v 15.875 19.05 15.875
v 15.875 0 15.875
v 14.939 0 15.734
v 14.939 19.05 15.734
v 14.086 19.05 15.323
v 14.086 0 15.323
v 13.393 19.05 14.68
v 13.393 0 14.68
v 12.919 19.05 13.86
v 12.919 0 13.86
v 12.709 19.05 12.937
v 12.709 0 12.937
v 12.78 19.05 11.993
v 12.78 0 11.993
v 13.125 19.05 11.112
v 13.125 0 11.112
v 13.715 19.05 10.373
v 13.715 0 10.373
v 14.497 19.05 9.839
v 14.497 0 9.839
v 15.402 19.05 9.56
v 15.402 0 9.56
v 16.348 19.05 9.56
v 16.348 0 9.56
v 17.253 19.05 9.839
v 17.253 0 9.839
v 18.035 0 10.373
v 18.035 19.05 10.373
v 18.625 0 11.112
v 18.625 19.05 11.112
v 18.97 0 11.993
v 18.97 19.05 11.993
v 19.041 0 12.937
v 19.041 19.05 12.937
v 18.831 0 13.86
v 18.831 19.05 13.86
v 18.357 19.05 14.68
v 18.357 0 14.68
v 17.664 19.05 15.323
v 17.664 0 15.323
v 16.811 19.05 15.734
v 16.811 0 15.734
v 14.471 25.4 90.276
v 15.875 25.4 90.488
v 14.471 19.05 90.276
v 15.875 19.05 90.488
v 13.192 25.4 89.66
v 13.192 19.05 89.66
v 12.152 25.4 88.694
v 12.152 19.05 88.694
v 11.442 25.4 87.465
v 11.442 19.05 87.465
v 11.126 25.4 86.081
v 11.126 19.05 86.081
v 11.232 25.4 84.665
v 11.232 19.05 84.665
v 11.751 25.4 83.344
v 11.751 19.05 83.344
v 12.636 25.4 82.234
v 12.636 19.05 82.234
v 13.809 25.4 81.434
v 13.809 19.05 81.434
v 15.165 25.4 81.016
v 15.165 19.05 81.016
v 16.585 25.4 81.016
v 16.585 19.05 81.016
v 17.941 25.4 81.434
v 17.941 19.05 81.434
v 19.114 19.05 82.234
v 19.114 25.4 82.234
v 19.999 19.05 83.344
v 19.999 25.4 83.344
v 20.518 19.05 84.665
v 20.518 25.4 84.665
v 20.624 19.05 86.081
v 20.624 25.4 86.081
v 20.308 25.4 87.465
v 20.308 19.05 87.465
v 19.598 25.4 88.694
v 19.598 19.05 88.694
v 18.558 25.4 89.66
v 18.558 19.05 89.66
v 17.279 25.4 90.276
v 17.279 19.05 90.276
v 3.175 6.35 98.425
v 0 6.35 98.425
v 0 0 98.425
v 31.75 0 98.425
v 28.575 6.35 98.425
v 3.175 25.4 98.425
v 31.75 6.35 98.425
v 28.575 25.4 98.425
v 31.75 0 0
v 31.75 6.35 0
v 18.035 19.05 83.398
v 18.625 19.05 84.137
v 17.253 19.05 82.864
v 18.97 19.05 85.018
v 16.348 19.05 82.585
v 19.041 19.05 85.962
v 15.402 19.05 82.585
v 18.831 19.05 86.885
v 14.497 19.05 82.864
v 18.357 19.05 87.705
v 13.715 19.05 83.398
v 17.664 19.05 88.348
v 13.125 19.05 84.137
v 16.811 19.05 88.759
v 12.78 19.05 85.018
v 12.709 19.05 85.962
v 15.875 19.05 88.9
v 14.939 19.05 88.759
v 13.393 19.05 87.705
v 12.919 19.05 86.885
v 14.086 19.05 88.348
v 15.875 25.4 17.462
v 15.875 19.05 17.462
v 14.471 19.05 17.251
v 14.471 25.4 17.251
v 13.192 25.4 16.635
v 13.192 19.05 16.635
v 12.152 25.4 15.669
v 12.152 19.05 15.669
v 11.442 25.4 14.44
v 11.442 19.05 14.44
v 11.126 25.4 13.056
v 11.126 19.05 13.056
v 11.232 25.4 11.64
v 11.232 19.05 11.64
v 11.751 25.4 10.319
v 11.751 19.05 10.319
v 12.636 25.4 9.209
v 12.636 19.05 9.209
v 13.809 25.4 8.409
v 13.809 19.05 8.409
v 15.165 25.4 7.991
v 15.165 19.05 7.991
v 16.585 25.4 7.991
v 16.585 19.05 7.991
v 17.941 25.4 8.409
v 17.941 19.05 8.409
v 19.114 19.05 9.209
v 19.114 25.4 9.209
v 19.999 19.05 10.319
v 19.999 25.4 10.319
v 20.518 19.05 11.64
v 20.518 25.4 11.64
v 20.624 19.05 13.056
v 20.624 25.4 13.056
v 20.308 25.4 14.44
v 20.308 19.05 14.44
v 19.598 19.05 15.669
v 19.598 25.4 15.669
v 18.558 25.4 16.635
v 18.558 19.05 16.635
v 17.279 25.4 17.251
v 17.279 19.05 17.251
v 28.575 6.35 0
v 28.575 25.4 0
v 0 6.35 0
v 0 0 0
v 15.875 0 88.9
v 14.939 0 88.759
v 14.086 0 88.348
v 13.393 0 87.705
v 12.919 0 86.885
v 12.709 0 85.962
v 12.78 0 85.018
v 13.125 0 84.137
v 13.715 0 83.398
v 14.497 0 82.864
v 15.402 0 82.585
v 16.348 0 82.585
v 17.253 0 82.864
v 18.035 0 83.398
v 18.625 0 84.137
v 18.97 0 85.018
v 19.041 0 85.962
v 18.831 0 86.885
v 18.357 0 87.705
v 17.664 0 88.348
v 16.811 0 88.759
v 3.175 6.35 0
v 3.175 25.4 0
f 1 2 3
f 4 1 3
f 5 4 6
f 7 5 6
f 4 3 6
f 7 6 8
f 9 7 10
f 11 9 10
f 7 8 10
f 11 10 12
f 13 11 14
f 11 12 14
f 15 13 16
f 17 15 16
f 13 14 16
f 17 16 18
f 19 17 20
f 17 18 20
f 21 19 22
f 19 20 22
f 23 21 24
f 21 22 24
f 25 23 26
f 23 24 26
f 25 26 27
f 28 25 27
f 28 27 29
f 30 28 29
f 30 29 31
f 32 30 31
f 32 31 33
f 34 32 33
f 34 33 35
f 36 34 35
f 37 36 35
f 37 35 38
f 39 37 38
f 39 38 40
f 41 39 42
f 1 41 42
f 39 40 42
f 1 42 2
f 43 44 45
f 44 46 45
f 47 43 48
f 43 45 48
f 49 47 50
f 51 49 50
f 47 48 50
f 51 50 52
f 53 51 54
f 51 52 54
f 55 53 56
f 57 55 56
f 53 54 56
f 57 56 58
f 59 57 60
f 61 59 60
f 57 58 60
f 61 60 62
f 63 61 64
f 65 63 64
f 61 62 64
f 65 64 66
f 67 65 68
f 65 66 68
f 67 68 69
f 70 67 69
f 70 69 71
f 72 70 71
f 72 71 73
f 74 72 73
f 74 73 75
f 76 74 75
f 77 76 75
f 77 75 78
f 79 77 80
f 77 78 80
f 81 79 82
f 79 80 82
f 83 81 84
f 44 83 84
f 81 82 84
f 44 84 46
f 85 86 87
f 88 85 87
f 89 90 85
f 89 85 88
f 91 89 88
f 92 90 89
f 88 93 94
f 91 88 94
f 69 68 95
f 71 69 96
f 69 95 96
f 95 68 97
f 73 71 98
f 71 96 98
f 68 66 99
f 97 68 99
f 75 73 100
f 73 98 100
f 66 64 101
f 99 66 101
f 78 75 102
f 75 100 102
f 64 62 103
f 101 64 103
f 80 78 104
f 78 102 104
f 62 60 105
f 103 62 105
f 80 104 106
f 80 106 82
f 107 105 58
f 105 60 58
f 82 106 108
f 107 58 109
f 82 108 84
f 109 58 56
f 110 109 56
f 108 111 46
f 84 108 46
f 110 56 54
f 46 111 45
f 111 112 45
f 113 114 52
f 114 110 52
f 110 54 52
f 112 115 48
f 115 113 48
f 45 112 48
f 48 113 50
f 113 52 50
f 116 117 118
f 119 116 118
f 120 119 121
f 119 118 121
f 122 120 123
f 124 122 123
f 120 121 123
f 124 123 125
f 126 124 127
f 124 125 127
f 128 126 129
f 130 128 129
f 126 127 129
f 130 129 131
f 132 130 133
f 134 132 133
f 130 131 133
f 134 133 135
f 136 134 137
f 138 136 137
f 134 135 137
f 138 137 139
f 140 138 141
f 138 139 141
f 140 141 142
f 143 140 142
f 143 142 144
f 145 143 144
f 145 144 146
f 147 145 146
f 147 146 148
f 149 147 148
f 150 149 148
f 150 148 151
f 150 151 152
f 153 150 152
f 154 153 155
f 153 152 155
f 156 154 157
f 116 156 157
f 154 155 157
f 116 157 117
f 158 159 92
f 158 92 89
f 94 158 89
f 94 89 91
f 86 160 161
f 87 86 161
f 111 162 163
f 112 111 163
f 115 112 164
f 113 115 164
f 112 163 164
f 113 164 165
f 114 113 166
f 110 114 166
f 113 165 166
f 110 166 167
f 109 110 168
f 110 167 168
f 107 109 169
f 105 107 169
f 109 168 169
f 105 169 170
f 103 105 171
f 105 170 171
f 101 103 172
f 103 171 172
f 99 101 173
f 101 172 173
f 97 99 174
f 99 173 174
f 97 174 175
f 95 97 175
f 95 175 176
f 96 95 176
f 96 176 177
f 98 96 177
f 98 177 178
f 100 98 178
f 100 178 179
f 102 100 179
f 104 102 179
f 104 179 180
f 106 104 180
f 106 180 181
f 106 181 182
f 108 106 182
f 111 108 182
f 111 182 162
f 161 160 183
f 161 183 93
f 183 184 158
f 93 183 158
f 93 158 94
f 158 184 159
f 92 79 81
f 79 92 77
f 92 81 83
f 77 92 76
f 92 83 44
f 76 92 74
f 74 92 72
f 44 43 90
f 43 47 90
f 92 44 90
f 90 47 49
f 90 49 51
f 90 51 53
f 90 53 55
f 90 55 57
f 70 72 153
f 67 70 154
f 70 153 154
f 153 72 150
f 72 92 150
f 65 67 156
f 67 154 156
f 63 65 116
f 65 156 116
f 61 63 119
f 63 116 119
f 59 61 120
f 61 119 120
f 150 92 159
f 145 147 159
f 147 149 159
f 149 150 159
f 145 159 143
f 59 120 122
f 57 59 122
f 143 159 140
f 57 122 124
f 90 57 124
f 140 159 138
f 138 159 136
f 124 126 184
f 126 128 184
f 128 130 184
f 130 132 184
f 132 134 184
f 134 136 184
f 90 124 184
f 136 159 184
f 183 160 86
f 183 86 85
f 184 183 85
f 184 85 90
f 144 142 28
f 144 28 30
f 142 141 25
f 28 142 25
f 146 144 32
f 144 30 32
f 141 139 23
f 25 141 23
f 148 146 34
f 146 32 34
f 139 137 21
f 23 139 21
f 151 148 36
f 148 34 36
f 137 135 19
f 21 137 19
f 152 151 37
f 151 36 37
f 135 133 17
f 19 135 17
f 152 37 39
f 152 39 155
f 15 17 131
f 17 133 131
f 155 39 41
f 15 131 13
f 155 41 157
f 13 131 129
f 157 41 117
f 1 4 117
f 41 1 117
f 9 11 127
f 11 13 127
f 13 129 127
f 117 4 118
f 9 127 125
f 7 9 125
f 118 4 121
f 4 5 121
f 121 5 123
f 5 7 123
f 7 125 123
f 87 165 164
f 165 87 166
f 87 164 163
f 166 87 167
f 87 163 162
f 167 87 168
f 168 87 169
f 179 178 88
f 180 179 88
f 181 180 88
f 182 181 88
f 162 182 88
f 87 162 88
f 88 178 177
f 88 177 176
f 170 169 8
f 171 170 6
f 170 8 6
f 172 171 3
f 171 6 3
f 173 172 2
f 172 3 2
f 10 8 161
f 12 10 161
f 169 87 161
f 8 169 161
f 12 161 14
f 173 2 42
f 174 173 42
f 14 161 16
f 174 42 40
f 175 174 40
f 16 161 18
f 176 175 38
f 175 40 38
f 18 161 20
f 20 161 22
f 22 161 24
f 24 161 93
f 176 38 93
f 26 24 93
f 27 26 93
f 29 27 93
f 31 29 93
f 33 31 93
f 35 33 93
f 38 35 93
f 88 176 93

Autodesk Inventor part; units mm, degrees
ref_plane "YZ Plane" through (0, 0, 0) normal (1, 0, 0) x (0, 1, 0)
ref_plane "XZ Plane" through (0, 0, 0) normal (0, 1, 0) x (-1, 0, 0)
ref_plane "XY Plane" through (0, 0, 0) normal (0, 0, 1) x (1, 0, 0)
sketch "Sketch1" plane through (0, 0, 0) normal (0, 0, 1) x (1, 0, 0)
  line L0 (0, 0) -> (31.75, 0)
  line L1 (31.75, 0) -> (31.75, 6.35)
  line L2 (31.75, 25.4) -> (28.575, 25.4) construction
  line L3 (0, 25.4) -> (0, 6.35) construction
  line L4 (0, 6.35) -> (3.175, 6.35)
  line L5 (3.175, 6.35) -> (3.175, 25.4)
  line L6 (28.575, 25.4) -> (28.575, 6.35)
  line L7 (28.575, 6.35) -> (31.75, 6.35)
  line L8 (0, 6.35) -> (0, 0)
  line L9 (3.175, 25.4) -> (0, 25.4) construction
  line L10 (28.575, 25.4) -> (3.175, 25.4)
  line L11 (31.75, 6.35) -> (31.75, 25.4) construction
  dimension "d0" = 31.75
  dimension "d1" = 25.4
  dimension "d2" = 6.35
  dimension "d3" = 3.175
extrude "Extrusion1" add sketch "Sketch1" along normal blind 98.425
sketch "Sketch2" plane through (3.175, 25.4, 0) normal (0, 1, 0) x (1, 0, 0)
  line L0 (0, -98.425) -> (25.4, -98.425) projected
  line L1 (25.4, 0) -> (25.4, -98.425) projected
  line L2 (25.4, 0) -> (0, 0) projected
  line L3 (0, 0) -> (0, -98.425) projected
  point P0 (-3.175, 0)
  point P1 (12.7, -85.725)
  point P2 (12.7, -12.7)
  dimension "d6" = 12.7
  dimension "d7" = 12.7
  dimension "d8" = 12.7
  dimension "d9" = 12.7
hole "Hole1" at (15.875, 25.4, 85.725) at (15.875, 25.4, 12.7) direction (0, -1, 0) diameter 6.35 end through all counterbore diameter 9.525 counterbore depth 6.35
equation "\"d9\" = d6"
properties part number "8 ball plastic slider"
